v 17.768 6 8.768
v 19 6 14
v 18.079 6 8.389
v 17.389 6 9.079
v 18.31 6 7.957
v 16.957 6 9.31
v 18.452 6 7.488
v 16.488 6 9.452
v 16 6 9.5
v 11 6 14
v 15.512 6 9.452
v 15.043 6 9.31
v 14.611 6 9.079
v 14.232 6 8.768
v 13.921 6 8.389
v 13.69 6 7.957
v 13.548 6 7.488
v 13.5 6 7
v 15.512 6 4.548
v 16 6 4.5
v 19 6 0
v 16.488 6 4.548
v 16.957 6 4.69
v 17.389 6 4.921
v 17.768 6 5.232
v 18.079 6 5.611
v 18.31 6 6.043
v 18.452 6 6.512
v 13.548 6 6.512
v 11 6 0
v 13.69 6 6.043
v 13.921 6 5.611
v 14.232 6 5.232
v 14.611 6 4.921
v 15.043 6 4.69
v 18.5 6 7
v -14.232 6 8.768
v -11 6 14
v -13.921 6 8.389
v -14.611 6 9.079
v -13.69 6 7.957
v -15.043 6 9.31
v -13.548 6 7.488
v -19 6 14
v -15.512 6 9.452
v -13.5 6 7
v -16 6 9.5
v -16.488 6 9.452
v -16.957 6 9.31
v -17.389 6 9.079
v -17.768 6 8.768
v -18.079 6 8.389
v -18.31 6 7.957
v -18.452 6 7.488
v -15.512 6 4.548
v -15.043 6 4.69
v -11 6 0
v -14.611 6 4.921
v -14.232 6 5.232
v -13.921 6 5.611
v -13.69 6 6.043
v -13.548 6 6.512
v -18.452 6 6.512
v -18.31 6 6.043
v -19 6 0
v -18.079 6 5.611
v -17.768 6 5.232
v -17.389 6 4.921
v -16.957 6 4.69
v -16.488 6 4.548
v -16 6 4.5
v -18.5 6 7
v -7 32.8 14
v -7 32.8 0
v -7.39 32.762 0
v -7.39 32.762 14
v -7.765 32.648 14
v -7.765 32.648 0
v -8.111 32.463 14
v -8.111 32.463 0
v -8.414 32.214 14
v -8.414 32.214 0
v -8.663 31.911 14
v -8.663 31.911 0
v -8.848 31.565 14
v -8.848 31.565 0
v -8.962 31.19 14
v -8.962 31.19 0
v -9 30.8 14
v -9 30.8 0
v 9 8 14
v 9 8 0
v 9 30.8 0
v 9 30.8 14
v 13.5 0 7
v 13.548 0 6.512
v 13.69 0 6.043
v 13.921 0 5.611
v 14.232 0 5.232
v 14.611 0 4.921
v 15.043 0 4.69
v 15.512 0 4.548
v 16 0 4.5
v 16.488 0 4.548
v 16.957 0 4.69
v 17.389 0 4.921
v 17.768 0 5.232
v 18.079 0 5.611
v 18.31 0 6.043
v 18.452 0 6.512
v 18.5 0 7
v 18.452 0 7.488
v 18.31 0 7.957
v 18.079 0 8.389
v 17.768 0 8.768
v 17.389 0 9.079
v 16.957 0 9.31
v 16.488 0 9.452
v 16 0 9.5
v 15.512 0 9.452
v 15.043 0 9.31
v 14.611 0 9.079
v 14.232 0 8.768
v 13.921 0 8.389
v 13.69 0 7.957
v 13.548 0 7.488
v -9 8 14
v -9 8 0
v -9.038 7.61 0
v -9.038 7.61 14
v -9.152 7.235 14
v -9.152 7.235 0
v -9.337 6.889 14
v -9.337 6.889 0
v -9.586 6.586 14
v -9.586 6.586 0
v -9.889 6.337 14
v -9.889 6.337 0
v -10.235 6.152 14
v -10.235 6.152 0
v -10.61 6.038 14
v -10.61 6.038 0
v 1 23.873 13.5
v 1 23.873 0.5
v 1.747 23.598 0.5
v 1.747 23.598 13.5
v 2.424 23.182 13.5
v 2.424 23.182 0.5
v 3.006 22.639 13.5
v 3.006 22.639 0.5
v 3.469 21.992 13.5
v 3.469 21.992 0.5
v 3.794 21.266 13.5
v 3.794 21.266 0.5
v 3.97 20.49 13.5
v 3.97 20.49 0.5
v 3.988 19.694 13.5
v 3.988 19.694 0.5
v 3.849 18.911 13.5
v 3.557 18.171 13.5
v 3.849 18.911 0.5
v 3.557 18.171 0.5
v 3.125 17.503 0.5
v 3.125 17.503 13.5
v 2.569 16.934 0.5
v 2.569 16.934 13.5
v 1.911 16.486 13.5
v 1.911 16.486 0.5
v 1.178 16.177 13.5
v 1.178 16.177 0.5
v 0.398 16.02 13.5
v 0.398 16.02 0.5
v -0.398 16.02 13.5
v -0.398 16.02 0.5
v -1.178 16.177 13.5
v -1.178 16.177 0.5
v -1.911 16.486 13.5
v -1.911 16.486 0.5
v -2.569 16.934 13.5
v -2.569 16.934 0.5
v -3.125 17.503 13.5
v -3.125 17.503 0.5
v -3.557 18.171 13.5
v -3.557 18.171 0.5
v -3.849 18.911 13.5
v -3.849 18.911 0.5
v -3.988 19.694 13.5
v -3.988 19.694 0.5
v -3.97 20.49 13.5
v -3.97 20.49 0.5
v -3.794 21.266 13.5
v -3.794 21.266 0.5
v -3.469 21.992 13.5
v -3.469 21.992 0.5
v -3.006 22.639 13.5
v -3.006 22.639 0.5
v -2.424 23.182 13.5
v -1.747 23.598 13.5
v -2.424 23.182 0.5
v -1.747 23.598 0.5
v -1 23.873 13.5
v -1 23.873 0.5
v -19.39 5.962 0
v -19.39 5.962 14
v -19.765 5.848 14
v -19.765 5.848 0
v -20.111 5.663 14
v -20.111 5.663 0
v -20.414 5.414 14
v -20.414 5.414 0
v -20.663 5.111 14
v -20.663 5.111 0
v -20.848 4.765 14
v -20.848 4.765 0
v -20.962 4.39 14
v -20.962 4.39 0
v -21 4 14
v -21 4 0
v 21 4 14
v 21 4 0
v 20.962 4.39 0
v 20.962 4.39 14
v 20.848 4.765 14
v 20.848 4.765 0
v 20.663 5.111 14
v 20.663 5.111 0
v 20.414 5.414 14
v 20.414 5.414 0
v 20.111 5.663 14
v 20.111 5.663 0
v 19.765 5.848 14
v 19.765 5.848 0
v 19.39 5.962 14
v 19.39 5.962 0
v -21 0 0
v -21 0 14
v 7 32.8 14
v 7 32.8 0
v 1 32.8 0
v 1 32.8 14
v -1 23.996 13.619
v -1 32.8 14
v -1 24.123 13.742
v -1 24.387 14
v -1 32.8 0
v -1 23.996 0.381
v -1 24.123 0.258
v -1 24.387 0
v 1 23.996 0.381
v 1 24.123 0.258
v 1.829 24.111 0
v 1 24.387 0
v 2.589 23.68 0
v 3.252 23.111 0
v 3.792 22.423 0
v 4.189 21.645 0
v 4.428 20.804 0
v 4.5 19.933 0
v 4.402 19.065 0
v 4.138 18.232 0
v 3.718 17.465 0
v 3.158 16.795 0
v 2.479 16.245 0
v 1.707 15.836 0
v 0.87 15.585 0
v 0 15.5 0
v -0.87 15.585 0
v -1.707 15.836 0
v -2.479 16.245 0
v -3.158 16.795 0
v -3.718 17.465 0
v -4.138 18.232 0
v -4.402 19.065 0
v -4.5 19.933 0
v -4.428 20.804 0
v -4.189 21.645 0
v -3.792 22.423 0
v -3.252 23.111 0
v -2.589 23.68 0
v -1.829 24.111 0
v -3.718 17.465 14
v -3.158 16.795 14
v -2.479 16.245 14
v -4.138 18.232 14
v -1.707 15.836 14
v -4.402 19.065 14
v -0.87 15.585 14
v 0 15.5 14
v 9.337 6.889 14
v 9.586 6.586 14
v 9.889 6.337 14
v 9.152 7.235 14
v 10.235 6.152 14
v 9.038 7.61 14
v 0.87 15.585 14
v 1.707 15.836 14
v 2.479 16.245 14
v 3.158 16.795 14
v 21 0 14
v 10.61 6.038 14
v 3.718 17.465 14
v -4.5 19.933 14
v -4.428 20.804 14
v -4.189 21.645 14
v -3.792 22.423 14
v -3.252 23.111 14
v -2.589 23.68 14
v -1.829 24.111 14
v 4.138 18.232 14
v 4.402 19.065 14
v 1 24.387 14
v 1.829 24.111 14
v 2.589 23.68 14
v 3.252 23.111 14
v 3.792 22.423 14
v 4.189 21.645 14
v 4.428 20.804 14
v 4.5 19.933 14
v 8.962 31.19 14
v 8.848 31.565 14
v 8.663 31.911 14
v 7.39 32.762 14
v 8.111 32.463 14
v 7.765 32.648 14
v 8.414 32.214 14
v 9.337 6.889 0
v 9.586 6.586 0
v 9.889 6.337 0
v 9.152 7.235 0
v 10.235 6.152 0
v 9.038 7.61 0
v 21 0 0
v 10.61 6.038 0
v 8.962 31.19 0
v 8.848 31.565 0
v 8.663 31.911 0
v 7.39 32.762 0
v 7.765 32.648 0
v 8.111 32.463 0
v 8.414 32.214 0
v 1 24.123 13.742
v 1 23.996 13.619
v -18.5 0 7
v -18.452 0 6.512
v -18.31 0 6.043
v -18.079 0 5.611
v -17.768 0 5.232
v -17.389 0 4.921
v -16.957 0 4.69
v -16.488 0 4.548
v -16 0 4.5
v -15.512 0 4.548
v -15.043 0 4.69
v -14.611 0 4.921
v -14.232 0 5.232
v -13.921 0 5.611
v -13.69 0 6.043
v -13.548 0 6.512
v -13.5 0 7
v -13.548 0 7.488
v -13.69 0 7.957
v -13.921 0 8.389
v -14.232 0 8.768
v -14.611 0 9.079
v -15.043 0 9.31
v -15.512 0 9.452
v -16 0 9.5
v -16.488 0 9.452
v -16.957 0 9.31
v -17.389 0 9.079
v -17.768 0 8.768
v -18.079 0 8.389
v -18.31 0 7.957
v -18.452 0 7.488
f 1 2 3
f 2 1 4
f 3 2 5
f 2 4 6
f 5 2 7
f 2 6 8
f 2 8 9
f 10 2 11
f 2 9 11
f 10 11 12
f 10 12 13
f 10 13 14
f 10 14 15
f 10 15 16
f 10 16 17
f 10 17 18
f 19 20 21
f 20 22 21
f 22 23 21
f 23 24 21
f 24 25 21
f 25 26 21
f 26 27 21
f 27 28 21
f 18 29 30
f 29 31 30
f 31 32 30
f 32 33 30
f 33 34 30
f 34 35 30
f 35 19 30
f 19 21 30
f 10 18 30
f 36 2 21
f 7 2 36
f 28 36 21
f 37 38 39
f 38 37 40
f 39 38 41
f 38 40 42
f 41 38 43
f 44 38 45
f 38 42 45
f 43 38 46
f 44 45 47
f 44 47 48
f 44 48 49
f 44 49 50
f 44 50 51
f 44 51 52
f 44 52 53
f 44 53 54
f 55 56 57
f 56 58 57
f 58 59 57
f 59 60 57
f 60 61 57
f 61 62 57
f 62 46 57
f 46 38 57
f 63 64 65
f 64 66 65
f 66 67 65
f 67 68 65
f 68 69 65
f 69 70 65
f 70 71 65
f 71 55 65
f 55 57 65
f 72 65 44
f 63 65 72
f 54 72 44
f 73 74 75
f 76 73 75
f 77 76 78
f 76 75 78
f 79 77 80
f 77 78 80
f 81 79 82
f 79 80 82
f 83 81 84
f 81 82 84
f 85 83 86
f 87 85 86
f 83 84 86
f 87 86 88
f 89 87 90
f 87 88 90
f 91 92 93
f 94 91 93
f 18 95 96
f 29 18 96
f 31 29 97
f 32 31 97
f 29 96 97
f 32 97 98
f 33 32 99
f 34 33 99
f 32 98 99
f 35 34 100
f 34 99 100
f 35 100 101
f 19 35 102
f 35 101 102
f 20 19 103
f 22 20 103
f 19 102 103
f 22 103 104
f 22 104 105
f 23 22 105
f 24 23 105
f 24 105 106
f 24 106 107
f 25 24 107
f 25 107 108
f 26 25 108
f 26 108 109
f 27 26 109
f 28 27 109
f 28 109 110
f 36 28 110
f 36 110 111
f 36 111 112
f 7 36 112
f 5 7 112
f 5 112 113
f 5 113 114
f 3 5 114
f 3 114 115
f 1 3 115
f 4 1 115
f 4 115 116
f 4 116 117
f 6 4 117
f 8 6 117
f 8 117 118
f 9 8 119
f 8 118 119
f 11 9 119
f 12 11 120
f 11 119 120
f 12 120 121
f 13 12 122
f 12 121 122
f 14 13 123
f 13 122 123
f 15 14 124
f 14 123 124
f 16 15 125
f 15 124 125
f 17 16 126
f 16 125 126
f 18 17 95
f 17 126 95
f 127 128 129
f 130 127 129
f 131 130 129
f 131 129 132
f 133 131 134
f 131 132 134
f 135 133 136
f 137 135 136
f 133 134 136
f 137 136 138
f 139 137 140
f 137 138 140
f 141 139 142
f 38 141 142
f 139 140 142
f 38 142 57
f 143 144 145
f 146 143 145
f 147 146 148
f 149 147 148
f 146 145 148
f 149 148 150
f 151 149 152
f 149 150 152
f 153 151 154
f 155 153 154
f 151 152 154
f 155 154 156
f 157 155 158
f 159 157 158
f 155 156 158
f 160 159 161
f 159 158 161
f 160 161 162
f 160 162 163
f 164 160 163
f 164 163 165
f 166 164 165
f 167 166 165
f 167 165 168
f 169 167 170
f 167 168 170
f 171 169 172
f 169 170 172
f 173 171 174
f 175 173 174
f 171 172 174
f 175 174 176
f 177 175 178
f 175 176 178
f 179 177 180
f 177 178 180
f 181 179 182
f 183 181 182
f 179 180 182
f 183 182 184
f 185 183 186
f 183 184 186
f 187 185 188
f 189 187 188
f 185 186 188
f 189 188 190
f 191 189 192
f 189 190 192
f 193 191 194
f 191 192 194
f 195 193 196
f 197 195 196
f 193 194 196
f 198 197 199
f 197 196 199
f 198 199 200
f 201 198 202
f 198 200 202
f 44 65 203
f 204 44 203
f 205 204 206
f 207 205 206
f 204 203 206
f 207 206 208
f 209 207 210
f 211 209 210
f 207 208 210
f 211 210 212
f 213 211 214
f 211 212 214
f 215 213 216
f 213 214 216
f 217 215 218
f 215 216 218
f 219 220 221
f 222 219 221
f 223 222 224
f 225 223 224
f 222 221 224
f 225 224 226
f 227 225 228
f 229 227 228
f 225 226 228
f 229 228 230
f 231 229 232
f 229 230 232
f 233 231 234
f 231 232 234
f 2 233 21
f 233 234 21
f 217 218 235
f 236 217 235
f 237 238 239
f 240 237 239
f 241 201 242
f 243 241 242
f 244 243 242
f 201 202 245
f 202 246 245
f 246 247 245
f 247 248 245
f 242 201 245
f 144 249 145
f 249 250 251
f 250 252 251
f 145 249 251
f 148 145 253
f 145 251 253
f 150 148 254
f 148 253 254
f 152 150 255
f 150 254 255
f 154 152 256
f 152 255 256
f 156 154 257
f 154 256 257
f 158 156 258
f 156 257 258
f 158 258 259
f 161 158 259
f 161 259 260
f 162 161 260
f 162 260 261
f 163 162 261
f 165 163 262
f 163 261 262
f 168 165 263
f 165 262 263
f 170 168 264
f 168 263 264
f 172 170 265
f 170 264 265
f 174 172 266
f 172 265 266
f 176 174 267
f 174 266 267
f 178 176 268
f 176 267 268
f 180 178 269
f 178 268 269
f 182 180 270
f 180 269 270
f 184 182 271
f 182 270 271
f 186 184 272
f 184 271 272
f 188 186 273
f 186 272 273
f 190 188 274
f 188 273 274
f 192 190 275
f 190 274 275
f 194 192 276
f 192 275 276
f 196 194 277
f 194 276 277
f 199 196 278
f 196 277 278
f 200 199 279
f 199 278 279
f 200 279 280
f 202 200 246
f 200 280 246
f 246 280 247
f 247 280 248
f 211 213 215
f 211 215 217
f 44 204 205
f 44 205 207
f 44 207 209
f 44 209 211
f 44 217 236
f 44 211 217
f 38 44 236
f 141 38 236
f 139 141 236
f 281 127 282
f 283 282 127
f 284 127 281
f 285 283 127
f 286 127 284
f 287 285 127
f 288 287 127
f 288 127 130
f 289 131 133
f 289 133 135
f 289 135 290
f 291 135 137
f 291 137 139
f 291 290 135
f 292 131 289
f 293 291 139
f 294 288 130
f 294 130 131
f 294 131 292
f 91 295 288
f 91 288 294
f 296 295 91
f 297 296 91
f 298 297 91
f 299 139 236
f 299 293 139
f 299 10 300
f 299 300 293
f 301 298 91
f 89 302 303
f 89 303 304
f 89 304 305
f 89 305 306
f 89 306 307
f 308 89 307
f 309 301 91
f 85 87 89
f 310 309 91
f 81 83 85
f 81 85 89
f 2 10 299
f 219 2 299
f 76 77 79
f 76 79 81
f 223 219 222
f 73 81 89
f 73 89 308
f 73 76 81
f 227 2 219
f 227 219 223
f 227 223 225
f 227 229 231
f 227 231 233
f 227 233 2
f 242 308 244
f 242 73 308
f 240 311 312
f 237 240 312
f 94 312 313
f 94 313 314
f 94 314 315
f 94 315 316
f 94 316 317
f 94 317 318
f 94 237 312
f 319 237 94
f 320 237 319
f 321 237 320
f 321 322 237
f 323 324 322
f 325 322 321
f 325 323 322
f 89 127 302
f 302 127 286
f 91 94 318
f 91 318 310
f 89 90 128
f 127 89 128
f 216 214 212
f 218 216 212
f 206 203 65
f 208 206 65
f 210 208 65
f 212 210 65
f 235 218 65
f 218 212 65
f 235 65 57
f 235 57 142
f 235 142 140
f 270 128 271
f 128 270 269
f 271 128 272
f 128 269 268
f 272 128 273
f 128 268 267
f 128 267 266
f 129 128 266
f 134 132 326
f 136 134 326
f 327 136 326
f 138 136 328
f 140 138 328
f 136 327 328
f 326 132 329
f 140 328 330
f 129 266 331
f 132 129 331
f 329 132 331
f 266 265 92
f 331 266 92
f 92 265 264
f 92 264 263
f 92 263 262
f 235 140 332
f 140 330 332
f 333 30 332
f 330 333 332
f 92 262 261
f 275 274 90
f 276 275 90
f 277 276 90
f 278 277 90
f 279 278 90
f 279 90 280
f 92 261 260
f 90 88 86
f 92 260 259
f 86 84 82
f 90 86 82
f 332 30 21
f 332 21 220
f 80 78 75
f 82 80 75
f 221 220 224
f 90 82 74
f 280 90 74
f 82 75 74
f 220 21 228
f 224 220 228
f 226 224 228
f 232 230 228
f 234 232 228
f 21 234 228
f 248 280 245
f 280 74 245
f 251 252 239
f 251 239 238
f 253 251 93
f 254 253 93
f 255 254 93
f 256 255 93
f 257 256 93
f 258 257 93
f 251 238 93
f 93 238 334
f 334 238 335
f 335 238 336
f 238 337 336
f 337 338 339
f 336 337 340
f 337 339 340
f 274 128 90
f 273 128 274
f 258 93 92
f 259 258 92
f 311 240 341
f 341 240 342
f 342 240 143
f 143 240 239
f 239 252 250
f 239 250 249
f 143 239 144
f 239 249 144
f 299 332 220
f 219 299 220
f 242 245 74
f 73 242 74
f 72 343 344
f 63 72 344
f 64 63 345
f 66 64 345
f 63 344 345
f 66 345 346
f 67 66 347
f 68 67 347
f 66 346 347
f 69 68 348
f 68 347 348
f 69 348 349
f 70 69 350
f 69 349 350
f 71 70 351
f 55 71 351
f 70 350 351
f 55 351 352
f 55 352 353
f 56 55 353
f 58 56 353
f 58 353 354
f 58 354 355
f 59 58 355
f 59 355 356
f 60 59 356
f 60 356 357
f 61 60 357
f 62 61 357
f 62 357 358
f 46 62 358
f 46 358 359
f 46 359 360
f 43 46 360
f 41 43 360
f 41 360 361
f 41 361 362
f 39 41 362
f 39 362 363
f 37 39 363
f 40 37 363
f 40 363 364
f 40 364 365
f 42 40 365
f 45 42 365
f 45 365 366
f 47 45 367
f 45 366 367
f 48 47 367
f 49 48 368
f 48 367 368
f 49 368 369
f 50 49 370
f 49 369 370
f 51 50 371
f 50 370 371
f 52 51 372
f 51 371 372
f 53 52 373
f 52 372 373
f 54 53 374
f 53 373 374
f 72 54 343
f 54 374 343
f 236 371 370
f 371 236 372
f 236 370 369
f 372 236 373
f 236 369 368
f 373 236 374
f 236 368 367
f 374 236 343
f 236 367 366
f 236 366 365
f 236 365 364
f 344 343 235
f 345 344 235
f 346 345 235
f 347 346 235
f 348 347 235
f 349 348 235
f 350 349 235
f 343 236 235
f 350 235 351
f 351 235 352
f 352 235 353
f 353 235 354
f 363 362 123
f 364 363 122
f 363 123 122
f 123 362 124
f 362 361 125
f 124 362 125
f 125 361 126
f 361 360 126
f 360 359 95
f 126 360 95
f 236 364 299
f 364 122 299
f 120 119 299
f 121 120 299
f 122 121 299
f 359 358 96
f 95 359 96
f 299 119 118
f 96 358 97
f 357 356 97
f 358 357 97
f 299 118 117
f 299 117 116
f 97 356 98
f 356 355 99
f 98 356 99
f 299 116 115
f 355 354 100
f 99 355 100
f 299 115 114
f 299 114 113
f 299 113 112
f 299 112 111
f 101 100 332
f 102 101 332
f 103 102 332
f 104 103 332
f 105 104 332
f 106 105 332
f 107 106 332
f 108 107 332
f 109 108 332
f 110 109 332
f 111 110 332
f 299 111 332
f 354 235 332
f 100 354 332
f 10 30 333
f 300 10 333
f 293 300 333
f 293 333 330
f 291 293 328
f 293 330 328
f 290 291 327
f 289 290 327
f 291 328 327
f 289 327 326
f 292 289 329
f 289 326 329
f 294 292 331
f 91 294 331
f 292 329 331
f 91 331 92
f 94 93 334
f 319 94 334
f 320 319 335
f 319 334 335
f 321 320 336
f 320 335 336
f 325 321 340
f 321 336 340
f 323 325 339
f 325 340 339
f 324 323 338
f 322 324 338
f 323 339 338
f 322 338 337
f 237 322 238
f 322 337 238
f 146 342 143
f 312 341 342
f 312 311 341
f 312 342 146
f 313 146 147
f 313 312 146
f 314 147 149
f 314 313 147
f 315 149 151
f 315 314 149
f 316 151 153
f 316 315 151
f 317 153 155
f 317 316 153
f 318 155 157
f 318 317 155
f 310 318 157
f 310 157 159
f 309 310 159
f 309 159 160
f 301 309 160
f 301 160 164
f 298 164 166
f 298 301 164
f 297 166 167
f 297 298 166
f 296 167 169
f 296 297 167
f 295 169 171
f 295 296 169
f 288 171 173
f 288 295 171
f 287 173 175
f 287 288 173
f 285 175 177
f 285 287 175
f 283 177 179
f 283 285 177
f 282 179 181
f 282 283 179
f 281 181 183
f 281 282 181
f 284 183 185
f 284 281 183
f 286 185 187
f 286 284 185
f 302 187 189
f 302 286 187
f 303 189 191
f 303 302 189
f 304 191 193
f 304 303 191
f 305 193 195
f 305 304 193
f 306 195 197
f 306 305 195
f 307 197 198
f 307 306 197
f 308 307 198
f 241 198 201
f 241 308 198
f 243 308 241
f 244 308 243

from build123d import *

# Parameters (mm, degrees)
BOSS_EXTRUDE1_DEPTH   = 14
CHAMFER1_SIZE         = 0.5
M6X1_0_TAPPED_HOLE1_D = 5


with BuildPart() as part:
    # Sketch1 → Boss-Extrude1 (new body)
    with BuildSketch(Plane.XY):
        with BuildLine():
            Line((-21, 4), (-21, 0))
            Line((-21, 0), (21, 0))
            Line((21, 0), (21, 4))
            ThreePointArc((21, 4), (20.414213562, 5.414213562), (19, 6))
            Line((19, 6), (11, 6))
            ThreePointArc((11, 6), (9.585786438, 6.585786438), (9, 8))
            Line((9, 8), (9, 30.8))
            ThreePointArc((9, 30.8), (8.414213562, 32.214213562), (7, 32.8))
            Line((7, 32.8), (1, 32.8))
            Line((1, 32.8), (1, 23.872983346))
            ThreePointArc((1, 23.872983346), (0, 16), (-1, 23.872983346))
            Line((-1, 23.872983346), (-1, 32.8))
            Line((-1, 32.8), (-7, 32.8))
            ThreePointArc((-7, 32.8), (-8.414213562, 32.214213562), (-9, 30.8))
            Line((-9, 30.8), (-9, 8))
            ThreePointArc((-9, 8), (-9.585786438, 6.585786438), (-11, 6))
            Line((-11, 6), (-19, 6))
            ThreePointArc((-19, 6), (-20.414213562, 5.414213562), (-21, 4))
        make_face()
    extrude(amount=BOSS_EXTRUDE1_DEPTH)

    # Chamfer1
    chamfer1_edges = [part.edges().sort_by_distance(p)[0] for p in [
        (0, 16, 0),
        (0, 16, 14),
    ]]
    chamfer(chamfer1_edges, length=CHAMFER1_SIZE)

    # M6x1.0 Tapped Hole1 (through all)
    with Locations(Plane(origin=(0, 6, 0), x_dir=(1, 0, 0), z_dir=(0, 1, 0))):
        with Locations((-16, -7), (16, -7)):
            Hole(M6X1_0_TAPPED_HOLE1_D / 2)


solid = part.part
